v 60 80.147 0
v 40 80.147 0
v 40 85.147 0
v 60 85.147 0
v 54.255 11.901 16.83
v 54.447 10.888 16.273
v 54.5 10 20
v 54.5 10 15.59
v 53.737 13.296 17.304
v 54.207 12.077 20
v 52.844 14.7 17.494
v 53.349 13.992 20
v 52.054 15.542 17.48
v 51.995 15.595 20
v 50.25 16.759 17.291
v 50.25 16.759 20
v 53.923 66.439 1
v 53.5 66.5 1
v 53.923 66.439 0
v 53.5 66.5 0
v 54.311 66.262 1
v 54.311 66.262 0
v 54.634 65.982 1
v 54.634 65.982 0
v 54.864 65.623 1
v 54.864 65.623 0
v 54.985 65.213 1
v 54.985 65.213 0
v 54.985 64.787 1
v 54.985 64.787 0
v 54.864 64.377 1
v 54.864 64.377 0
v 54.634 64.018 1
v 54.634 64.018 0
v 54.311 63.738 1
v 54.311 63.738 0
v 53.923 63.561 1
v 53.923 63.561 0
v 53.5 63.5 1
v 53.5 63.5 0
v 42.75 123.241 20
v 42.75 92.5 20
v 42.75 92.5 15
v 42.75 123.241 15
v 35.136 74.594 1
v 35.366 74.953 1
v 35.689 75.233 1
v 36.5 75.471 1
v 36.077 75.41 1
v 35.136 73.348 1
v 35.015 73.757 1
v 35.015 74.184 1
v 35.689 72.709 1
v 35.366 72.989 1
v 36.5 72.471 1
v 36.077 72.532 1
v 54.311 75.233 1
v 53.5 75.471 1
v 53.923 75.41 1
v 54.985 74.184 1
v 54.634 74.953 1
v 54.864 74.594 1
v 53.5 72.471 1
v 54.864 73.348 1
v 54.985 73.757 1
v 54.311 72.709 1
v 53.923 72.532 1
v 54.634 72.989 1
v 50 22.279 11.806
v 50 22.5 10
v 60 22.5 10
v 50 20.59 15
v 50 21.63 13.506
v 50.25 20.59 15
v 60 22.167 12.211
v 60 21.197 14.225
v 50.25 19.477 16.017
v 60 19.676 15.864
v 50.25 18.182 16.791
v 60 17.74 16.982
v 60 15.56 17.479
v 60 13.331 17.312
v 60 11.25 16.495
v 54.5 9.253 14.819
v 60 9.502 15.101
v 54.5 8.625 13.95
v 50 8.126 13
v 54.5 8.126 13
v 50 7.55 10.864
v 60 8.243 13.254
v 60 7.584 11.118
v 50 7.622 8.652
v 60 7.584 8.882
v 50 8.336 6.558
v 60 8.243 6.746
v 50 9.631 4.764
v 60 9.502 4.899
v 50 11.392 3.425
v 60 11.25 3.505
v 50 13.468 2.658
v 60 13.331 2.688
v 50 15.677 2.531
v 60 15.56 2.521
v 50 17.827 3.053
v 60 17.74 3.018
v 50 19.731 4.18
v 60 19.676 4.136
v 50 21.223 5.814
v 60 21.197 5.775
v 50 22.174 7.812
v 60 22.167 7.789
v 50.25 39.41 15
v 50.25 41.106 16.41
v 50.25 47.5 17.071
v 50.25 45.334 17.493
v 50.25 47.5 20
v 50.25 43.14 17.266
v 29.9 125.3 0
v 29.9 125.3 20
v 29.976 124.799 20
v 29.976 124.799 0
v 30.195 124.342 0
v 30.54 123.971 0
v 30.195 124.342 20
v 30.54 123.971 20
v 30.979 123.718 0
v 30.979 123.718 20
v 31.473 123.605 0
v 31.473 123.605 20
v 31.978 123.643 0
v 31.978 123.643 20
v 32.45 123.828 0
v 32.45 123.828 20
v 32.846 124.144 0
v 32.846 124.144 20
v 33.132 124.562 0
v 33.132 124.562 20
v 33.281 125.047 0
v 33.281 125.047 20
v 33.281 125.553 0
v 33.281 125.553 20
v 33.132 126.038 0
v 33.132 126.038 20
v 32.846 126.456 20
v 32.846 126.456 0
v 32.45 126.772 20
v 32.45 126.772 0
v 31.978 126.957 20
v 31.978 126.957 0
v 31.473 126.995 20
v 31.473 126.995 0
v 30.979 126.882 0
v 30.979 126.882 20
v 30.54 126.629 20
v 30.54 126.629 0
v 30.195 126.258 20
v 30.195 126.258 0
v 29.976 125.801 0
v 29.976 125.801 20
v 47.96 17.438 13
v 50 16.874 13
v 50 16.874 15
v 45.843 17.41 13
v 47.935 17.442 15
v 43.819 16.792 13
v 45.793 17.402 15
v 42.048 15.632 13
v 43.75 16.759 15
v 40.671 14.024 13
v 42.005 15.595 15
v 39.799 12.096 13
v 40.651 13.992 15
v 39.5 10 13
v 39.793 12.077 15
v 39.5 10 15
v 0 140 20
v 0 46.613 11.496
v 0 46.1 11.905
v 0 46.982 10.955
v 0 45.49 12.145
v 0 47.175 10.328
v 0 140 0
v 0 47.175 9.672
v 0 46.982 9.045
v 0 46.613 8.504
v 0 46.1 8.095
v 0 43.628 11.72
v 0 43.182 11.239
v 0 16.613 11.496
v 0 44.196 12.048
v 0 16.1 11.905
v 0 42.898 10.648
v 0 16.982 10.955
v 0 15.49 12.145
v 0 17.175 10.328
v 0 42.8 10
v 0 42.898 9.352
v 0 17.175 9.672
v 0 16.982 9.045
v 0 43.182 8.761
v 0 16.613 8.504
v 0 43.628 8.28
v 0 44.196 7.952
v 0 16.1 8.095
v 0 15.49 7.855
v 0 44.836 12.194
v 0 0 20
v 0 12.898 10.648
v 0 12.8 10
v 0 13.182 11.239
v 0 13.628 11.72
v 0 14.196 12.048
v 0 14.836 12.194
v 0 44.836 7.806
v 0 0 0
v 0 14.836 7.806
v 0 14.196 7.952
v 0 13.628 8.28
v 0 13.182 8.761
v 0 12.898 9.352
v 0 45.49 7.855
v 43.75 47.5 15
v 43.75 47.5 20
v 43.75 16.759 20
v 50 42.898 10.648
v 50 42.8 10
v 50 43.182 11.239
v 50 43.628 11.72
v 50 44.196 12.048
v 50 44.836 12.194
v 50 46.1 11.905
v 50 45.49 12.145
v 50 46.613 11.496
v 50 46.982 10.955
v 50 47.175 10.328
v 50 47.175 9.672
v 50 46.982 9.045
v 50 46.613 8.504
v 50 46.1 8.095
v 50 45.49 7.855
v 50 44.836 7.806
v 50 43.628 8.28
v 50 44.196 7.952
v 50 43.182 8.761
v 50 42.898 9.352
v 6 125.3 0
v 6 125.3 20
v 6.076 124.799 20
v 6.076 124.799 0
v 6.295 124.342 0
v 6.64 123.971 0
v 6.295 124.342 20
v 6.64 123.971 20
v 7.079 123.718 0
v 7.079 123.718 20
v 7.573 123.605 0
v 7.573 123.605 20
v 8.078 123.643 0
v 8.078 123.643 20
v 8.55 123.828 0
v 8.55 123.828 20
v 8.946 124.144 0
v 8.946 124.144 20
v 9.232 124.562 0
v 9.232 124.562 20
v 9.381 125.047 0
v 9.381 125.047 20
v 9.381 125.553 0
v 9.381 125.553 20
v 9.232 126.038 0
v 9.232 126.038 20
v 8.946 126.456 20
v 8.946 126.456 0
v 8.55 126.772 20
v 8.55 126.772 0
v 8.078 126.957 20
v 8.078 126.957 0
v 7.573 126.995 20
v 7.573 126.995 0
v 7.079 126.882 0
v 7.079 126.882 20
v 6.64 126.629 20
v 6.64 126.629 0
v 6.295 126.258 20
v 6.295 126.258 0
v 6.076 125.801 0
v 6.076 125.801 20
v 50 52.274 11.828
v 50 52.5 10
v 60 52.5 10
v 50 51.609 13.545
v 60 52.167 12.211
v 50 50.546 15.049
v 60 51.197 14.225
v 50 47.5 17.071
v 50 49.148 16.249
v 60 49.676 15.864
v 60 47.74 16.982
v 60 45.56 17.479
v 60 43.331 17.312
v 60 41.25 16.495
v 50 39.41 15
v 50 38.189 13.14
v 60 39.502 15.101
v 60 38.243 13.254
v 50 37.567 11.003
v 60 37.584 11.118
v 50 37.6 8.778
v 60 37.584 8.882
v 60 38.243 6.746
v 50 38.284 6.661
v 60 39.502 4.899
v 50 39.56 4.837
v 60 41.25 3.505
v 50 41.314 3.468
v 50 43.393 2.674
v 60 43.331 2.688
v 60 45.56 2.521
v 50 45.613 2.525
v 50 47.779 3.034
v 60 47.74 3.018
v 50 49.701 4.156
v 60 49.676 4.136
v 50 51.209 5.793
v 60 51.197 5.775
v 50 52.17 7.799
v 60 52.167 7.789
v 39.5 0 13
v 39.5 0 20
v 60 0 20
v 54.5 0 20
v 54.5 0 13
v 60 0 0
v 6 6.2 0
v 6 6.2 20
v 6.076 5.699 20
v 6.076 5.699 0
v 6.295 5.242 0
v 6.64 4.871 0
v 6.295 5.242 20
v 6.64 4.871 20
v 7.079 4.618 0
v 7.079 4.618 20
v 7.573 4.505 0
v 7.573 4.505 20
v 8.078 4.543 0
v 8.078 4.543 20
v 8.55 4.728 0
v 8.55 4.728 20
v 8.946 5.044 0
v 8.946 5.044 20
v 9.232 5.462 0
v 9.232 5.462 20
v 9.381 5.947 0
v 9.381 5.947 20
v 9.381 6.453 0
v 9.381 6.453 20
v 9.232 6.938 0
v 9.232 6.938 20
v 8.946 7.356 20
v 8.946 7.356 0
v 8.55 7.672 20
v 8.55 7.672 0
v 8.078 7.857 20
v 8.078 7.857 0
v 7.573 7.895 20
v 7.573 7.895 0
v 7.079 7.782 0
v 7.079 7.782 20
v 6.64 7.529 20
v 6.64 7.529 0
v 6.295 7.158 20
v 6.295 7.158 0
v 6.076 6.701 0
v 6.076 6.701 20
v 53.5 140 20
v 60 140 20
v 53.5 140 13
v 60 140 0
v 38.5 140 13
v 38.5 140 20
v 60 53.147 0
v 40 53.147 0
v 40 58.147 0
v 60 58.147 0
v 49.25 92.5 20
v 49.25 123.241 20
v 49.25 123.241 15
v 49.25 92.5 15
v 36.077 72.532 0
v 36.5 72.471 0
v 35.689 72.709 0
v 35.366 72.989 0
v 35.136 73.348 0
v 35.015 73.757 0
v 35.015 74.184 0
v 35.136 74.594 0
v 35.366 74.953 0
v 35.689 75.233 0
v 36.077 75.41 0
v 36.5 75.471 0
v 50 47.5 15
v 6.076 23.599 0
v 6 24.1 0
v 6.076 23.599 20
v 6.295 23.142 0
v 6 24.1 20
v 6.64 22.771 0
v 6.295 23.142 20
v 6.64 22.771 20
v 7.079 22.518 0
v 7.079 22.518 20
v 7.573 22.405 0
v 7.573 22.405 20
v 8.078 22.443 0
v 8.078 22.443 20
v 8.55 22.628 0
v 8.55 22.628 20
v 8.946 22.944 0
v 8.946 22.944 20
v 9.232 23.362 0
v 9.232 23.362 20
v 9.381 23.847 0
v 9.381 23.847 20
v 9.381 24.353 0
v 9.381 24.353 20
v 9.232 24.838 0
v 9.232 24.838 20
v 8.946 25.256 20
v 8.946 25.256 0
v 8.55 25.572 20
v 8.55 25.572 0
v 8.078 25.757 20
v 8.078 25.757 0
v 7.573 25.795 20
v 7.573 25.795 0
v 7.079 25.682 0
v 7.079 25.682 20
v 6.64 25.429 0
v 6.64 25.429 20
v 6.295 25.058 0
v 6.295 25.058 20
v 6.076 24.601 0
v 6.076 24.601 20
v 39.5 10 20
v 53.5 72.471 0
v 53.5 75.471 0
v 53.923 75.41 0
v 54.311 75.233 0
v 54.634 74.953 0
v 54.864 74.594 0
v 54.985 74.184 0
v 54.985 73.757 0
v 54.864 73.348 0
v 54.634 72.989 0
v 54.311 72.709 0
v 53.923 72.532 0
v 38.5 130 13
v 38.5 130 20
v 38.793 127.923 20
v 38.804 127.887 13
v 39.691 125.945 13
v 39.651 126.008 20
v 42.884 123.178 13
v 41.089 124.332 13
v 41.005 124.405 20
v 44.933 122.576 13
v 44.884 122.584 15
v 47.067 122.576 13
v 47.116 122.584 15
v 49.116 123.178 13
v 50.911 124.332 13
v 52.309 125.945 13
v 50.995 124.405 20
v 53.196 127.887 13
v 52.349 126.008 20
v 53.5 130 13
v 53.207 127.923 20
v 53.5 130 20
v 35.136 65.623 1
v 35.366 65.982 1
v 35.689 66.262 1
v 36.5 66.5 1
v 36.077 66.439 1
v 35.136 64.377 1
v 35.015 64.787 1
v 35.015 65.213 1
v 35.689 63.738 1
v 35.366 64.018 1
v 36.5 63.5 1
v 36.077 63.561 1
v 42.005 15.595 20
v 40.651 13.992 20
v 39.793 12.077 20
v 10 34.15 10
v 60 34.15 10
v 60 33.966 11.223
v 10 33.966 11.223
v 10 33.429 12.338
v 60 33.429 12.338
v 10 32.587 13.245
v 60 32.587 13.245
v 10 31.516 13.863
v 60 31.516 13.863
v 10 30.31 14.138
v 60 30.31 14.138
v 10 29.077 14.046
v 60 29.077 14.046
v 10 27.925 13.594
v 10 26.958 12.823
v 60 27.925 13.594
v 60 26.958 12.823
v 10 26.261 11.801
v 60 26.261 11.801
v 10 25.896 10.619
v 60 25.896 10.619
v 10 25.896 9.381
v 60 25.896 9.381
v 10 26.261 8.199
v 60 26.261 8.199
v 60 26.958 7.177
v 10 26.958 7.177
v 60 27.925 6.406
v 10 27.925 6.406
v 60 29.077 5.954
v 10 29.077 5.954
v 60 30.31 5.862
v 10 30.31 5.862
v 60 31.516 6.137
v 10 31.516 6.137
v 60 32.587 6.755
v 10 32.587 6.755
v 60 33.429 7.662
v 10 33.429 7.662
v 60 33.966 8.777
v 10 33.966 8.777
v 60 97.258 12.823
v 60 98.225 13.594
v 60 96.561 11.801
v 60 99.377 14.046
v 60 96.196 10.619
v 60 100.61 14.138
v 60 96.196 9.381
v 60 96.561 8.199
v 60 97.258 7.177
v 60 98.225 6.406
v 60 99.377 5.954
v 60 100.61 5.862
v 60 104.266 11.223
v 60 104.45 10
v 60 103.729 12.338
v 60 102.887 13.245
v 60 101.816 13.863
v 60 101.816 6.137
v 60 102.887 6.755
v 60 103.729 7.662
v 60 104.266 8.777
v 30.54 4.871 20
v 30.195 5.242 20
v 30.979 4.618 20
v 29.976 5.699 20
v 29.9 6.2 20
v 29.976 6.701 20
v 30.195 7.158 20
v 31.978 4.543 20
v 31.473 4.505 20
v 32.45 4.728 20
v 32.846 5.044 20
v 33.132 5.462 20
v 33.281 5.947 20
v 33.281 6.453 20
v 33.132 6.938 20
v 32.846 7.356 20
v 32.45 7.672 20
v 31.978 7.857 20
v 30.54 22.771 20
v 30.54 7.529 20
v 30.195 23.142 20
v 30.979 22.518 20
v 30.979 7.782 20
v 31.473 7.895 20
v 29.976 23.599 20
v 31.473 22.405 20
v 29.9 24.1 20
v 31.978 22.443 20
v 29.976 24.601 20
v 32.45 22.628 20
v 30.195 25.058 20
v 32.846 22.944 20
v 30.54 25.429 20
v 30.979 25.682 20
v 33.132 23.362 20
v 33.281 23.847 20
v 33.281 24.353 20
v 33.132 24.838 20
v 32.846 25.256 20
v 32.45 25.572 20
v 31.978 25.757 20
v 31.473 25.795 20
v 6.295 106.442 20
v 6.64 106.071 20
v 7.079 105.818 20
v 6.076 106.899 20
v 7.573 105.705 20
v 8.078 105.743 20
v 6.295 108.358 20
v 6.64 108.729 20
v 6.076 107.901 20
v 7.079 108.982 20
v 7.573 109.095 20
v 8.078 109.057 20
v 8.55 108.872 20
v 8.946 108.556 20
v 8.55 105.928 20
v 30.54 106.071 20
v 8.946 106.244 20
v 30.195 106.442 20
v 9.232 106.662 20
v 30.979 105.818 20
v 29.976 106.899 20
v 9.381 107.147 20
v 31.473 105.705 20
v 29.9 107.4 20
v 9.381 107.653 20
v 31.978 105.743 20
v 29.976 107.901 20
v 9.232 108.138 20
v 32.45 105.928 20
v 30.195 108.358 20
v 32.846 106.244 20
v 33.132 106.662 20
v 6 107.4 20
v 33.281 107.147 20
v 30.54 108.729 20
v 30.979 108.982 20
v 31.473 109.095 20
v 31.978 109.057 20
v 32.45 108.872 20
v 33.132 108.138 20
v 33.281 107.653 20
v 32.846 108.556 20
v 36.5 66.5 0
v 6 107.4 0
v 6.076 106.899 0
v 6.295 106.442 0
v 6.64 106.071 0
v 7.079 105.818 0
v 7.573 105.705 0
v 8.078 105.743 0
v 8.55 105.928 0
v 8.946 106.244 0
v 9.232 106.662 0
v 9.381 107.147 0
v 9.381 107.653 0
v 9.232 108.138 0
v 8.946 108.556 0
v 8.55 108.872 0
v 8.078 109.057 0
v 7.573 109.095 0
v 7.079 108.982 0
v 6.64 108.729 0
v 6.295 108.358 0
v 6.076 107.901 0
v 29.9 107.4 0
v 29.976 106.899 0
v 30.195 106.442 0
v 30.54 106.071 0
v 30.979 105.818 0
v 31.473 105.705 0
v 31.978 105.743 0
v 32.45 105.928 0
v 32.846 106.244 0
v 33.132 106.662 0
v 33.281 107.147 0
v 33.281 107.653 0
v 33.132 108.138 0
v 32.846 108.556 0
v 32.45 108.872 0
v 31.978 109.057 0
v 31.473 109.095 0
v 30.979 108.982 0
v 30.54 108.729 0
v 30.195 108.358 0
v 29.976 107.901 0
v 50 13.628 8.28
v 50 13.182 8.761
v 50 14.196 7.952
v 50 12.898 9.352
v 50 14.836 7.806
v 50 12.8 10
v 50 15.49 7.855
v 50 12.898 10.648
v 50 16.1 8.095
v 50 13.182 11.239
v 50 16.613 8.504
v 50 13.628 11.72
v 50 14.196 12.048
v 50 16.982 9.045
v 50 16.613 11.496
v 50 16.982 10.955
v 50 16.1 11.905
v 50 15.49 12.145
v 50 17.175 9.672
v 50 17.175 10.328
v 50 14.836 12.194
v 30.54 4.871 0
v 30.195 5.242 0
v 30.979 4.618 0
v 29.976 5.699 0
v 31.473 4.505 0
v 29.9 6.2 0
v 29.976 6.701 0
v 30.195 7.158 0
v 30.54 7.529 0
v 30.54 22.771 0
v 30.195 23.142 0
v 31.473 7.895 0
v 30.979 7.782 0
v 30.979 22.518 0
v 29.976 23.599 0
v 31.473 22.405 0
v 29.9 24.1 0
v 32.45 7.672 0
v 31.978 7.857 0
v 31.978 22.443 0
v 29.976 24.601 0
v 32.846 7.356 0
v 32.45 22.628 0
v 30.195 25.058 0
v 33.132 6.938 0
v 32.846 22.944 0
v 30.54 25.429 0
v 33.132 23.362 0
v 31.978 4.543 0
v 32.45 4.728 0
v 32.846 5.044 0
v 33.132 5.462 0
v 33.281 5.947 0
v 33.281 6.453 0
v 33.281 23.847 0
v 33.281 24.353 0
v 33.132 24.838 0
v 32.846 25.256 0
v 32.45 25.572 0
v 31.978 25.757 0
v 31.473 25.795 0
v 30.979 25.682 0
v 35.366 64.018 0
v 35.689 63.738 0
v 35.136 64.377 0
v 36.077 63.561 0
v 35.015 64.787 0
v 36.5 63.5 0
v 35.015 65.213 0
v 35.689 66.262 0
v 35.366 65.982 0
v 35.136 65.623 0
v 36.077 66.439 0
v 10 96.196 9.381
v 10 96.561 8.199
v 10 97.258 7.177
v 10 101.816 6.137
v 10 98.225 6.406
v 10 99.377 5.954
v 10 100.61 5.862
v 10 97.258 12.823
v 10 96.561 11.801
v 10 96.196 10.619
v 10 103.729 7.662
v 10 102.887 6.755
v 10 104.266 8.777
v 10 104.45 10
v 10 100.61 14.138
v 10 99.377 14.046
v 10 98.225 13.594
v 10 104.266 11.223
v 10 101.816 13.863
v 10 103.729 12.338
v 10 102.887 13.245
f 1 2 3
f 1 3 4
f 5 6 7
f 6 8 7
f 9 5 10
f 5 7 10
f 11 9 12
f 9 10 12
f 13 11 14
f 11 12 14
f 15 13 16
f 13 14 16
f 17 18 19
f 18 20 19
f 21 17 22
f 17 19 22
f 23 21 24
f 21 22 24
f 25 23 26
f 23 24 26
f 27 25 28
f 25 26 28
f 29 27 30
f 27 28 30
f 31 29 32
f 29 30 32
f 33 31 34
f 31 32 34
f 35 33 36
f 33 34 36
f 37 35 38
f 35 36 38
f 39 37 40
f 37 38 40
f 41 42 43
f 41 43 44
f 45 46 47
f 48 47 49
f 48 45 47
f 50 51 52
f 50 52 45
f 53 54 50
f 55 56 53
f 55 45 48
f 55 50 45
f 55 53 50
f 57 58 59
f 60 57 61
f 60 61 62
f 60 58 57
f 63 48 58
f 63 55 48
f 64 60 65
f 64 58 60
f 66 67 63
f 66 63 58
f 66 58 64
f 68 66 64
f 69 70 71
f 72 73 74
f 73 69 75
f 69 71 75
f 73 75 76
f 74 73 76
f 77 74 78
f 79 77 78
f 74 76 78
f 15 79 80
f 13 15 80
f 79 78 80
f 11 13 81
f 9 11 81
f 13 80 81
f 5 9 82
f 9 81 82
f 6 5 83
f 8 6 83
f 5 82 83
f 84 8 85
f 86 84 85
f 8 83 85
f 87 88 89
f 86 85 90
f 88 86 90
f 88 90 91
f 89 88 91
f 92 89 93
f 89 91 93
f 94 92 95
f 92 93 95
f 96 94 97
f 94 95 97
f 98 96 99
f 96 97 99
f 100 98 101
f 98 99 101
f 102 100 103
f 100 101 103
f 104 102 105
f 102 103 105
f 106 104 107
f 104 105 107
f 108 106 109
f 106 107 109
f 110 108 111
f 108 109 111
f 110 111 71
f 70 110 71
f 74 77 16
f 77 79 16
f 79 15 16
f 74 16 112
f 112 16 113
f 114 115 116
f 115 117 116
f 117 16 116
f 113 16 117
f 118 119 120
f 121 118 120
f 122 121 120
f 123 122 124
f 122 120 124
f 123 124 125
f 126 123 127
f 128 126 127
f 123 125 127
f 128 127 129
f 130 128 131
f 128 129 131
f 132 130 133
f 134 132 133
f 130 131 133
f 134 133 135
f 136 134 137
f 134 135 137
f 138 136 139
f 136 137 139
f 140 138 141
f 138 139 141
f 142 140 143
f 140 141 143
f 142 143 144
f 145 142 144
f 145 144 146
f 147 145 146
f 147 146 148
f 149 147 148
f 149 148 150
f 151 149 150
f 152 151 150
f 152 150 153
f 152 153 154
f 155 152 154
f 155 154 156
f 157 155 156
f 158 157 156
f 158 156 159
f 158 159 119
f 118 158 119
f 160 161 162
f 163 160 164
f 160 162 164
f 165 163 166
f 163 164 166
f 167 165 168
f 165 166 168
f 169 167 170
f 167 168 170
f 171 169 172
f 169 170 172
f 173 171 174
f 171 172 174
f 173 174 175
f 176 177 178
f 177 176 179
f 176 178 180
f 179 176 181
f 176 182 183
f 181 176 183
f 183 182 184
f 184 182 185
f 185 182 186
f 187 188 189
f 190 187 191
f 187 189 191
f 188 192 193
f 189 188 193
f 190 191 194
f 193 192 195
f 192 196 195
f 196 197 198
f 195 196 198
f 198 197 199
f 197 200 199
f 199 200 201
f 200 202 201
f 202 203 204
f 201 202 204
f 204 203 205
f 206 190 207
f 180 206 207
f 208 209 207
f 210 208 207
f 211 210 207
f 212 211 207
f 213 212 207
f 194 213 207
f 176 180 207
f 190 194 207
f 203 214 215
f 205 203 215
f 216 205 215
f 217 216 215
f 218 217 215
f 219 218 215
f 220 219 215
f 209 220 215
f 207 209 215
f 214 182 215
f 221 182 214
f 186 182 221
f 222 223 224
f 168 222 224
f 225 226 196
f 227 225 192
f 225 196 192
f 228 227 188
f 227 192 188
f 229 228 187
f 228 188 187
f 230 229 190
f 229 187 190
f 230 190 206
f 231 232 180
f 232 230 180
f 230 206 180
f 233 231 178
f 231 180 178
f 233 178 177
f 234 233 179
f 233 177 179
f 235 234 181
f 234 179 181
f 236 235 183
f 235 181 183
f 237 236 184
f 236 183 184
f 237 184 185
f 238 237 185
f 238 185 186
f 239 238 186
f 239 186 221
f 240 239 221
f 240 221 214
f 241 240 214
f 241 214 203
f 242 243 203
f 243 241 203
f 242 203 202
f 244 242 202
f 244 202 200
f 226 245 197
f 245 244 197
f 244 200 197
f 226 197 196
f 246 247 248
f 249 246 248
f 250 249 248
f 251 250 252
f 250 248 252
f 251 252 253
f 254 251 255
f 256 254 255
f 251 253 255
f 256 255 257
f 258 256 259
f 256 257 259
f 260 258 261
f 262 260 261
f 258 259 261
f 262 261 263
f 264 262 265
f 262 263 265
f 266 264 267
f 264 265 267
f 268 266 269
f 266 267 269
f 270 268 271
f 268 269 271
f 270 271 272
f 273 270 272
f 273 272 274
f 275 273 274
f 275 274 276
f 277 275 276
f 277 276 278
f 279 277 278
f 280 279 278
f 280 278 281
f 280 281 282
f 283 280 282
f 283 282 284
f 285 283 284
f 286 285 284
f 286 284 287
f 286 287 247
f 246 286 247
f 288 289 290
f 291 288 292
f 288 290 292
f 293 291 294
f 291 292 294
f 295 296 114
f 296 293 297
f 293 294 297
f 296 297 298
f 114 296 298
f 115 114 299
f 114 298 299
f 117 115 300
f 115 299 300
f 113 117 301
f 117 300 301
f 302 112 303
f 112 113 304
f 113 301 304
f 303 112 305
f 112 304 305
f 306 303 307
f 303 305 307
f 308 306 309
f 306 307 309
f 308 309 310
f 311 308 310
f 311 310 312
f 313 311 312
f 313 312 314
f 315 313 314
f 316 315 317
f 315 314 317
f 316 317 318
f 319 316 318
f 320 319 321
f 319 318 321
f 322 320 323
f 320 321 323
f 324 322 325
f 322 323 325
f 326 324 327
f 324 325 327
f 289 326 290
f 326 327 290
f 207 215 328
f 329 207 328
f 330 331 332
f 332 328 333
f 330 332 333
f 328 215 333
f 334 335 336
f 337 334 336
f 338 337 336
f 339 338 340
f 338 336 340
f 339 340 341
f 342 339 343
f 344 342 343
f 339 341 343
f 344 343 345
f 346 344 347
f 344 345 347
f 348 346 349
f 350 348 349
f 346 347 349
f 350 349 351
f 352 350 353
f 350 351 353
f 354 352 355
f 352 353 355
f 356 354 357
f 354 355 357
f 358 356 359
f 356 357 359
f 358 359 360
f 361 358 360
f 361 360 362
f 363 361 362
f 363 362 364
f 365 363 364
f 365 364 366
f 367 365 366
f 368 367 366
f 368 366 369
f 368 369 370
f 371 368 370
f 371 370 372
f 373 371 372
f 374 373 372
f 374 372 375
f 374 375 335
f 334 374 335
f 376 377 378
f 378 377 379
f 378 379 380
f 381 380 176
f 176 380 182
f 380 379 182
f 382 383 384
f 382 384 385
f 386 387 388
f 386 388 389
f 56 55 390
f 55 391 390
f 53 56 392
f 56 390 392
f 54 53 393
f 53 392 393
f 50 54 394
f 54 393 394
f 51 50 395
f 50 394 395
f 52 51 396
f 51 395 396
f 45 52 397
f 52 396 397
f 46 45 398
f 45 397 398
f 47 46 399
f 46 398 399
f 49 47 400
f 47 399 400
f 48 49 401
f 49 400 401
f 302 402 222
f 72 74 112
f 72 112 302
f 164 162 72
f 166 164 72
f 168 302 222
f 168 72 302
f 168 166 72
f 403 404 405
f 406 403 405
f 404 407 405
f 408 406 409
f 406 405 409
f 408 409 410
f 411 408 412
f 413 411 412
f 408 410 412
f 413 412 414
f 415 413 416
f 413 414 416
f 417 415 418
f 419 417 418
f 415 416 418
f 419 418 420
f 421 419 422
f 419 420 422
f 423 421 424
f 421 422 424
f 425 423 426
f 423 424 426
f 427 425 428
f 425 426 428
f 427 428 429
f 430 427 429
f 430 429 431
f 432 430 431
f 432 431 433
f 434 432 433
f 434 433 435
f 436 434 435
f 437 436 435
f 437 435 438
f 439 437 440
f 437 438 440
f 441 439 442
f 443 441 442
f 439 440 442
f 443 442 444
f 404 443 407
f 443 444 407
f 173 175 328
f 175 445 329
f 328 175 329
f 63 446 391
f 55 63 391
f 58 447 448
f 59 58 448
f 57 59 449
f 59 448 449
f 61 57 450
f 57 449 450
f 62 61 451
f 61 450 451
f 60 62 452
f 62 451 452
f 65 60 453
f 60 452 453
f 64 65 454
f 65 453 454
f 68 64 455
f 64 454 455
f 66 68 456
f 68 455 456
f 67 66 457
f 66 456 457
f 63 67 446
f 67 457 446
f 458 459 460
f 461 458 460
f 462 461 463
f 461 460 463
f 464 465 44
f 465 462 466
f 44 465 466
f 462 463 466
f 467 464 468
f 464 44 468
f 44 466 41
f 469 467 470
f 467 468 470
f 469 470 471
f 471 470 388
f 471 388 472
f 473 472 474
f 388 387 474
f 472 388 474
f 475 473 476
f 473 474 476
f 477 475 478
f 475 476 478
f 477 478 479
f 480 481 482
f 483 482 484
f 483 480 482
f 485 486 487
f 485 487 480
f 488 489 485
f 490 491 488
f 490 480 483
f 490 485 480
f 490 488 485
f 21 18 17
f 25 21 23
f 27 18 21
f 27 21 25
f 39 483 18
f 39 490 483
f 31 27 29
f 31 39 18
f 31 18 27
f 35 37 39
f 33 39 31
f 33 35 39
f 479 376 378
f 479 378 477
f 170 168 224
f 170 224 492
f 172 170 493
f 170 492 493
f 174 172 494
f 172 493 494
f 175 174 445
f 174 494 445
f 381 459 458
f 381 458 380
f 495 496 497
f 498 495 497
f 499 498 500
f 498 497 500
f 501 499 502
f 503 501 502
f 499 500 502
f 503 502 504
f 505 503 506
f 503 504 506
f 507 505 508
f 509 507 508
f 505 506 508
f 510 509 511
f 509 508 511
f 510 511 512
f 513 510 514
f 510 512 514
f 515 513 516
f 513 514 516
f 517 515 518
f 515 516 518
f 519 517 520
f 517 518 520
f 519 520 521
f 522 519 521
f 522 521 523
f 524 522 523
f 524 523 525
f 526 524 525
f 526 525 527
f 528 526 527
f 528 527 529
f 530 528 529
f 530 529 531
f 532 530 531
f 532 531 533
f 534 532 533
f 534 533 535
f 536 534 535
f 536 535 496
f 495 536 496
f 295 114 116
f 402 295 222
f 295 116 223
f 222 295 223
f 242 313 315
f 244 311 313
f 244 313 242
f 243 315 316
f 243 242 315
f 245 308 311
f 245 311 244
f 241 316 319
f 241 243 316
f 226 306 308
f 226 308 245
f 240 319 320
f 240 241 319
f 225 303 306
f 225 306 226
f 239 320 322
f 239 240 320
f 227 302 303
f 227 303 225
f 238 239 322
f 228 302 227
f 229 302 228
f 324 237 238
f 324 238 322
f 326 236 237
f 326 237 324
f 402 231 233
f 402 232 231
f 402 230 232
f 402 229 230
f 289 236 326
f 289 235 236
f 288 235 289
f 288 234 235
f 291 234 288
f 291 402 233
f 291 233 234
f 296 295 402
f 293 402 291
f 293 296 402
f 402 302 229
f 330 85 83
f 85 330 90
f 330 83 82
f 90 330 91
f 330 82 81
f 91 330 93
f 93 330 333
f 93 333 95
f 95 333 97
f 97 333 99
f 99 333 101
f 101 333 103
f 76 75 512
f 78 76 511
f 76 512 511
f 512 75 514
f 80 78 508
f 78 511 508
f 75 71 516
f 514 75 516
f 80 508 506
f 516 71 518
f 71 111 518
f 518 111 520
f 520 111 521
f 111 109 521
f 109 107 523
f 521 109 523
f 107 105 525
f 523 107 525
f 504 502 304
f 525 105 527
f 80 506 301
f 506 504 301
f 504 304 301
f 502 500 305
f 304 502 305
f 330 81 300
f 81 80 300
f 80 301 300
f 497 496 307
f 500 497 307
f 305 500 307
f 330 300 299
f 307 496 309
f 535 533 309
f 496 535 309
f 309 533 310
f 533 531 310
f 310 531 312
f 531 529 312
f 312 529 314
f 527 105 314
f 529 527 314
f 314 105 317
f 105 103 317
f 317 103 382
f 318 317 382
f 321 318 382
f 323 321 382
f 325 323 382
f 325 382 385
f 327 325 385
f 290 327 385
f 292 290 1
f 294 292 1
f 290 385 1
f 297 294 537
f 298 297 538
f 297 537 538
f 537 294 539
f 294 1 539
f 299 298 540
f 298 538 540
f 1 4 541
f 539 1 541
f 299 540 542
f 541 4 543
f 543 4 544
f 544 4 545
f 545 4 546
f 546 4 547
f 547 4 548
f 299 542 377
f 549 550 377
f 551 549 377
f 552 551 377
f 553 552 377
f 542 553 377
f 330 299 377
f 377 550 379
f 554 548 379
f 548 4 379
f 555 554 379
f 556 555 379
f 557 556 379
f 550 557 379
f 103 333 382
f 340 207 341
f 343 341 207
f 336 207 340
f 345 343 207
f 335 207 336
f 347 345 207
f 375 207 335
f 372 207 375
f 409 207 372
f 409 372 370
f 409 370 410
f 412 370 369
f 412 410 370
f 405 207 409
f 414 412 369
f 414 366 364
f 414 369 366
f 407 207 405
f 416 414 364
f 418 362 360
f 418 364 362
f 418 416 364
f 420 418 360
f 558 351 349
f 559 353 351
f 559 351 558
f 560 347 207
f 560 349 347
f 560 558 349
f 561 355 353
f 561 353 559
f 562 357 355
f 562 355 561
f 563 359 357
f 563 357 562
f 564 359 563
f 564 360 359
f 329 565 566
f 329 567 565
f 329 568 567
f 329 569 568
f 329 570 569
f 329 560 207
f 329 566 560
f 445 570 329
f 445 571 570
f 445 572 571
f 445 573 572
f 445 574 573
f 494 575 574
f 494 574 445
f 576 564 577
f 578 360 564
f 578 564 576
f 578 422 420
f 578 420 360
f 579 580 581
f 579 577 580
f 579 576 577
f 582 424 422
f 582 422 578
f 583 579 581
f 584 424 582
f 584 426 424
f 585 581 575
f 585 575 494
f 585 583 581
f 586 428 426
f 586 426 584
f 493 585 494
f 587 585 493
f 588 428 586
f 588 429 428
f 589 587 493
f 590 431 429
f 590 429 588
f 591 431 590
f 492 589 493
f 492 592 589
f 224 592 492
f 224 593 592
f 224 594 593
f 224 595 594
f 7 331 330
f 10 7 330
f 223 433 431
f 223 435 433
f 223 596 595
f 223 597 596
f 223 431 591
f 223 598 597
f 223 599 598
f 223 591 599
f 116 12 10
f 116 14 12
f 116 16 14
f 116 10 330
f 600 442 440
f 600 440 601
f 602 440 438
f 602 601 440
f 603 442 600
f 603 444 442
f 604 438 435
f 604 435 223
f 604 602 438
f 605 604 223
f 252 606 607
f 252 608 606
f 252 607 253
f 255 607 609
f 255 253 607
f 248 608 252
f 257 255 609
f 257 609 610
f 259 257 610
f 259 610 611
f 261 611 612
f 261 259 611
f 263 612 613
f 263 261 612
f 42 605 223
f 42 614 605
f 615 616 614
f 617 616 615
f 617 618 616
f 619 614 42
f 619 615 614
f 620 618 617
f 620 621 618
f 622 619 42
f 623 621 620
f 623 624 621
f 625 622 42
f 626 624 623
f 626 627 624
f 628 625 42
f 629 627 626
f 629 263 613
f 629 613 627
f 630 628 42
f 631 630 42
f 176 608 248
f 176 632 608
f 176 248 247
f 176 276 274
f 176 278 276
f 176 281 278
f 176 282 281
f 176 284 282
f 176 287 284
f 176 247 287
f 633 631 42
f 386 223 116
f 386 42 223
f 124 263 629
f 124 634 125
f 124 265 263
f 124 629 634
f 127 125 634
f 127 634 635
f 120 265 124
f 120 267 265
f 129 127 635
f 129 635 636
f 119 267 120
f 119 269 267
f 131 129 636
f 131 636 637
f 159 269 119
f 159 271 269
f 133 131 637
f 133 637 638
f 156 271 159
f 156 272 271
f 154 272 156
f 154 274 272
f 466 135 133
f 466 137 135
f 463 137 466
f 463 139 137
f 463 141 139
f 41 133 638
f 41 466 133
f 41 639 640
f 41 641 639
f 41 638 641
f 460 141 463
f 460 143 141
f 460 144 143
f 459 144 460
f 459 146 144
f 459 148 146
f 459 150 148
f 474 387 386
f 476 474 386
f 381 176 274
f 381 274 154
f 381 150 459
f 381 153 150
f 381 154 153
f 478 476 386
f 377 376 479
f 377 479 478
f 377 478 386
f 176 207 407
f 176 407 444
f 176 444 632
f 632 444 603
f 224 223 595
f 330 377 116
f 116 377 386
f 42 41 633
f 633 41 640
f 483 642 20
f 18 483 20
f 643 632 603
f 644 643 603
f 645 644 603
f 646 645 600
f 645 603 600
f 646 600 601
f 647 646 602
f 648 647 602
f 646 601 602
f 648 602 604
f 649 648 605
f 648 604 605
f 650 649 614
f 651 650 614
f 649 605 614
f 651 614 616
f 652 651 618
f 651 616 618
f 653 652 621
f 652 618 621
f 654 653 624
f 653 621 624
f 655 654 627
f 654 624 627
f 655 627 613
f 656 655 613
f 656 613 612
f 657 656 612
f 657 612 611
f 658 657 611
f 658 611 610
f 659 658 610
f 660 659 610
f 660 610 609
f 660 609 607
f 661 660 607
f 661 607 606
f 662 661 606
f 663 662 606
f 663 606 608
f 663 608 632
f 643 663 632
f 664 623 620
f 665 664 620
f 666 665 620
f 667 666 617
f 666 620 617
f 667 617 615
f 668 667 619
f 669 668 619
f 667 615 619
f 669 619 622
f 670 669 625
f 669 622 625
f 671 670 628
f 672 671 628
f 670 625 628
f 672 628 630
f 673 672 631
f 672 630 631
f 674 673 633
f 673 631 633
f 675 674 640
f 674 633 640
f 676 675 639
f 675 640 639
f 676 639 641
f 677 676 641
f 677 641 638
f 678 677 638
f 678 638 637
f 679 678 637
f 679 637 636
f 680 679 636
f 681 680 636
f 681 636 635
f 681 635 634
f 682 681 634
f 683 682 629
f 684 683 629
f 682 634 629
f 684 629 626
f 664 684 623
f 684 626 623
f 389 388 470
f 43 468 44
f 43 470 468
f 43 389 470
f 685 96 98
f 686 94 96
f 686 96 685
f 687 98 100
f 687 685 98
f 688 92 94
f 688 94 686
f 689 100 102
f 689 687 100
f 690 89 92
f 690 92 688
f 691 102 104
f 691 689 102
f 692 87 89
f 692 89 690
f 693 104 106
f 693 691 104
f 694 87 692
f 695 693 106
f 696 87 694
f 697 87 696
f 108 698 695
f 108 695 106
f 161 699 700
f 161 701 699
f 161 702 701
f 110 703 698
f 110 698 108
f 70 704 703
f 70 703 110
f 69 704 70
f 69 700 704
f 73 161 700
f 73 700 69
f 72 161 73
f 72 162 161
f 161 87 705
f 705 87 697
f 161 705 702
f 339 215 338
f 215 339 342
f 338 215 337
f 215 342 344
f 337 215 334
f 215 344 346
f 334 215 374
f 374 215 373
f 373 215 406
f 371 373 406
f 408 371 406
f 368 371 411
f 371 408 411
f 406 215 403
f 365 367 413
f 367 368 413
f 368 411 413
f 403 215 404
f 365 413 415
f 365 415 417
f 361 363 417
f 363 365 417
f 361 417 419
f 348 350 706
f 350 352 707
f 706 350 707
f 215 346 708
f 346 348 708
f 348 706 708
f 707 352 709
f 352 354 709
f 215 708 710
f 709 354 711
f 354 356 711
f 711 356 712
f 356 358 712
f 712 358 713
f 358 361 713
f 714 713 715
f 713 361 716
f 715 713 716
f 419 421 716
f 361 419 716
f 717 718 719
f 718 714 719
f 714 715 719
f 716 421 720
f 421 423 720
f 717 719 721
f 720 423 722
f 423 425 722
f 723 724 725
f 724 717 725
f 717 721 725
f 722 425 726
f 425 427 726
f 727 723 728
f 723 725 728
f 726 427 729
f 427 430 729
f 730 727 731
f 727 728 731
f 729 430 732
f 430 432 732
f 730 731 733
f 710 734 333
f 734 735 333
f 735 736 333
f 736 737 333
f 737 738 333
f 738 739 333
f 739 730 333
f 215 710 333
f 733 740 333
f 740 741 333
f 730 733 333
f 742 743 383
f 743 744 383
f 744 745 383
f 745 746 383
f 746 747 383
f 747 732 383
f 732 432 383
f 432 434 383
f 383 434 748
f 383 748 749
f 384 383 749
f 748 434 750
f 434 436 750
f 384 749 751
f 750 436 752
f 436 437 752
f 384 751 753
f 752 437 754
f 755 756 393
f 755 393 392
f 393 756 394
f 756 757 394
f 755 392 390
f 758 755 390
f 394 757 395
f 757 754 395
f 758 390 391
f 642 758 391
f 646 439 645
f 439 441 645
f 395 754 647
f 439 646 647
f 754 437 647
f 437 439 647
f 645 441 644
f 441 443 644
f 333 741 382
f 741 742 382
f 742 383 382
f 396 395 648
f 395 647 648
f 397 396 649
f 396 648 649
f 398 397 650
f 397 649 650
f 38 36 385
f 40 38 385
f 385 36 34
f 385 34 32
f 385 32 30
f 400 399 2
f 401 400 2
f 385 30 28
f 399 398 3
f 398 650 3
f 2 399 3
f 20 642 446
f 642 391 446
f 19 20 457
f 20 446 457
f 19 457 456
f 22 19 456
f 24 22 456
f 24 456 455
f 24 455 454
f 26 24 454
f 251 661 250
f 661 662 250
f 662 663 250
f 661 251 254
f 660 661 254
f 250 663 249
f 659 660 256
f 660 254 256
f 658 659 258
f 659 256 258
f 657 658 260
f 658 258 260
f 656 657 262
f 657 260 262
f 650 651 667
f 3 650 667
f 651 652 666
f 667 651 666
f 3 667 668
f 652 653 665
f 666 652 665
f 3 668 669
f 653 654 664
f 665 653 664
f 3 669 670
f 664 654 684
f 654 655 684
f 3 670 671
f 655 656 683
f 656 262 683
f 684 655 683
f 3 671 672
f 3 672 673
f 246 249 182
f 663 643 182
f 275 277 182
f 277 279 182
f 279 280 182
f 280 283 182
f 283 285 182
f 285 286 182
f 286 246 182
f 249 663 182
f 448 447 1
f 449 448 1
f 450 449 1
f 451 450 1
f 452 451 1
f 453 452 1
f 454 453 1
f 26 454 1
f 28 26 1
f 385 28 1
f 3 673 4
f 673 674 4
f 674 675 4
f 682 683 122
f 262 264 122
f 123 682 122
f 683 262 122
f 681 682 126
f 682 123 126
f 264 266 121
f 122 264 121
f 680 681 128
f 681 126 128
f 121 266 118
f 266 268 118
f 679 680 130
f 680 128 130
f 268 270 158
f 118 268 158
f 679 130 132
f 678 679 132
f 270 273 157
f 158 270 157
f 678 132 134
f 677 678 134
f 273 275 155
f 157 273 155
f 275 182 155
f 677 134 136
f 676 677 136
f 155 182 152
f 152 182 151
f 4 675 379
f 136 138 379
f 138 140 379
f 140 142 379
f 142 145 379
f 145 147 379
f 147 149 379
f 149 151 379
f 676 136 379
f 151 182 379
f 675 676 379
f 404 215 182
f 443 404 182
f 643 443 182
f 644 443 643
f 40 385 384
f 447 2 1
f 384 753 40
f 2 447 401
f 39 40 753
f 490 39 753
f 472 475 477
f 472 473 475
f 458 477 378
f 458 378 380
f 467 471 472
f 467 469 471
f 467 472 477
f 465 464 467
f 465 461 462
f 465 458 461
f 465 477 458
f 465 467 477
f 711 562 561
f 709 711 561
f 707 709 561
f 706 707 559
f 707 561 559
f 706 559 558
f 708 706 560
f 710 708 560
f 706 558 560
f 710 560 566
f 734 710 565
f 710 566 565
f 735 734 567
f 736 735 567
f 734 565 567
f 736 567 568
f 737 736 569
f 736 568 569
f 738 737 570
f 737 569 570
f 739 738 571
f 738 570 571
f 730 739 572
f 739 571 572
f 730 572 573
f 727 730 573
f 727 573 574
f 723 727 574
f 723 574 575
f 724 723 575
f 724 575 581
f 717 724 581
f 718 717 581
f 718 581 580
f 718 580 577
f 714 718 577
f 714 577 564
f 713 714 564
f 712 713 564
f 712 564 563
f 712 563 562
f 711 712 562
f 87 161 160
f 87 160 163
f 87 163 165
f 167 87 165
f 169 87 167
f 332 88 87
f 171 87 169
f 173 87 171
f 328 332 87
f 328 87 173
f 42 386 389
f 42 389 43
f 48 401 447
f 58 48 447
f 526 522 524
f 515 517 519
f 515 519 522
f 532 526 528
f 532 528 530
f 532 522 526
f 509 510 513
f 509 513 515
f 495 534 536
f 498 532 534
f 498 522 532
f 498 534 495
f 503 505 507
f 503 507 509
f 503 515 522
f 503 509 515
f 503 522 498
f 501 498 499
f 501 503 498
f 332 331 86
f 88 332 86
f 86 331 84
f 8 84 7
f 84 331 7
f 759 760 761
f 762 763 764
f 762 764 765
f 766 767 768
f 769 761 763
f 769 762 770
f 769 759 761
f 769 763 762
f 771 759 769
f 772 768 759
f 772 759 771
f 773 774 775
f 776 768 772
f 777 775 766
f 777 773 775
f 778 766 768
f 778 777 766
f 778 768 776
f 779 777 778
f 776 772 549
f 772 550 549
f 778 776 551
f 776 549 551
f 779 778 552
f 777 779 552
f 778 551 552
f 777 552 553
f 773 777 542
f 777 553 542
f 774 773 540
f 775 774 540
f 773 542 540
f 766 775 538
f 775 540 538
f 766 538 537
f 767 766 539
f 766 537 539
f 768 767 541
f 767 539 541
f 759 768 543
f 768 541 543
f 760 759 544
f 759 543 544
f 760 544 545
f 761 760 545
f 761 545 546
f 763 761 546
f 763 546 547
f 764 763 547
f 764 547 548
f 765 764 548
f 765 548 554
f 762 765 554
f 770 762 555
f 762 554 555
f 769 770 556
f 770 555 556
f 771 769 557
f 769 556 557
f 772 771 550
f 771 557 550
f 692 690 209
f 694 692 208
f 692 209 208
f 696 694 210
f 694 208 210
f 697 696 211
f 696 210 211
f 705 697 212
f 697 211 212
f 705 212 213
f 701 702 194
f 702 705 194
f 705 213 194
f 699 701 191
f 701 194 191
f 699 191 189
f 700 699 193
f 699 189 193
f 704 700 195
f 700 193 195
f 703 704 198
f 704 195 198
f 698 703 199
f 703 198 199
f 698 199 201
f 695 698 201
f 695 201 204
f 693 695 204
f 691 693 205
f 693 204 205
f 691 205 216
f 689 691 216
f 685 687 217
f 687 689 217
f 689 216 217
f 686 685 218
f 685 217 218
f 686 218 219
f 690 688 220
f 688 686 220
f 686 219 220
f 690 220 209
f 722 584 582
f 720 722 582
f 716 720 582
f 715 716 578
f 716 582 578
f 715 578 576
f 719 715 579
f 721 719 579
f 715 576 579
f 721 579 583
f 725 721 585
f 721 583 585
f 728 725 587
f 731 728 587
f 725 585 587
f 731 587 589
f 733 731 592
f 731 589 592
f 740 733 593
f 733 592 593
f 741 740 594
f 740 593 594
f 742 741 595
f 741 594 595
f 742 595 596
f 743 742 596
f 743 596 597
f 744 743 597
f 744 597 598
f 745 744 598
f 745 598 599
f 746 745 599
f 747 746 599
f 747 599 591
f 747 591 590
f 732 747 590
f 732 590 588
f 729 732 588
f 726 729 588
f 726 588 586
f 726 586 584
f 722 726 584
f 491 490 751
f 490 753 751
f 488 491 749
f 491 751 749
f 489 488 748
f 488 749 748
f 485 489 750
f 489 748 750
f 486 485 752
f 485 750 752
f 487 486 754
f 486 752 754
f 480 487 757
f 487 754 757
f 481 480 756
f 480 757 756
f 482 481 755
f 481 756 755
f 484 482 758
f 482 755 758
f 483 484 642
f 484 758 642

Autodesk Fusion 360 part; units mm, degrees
sketch "Skizze1" plane through (0, 0, 0) normal (0, 0, 1) x (1, 0, 0)
  line L0 (0, 0) -> (60, 0)
  line L1 (60, 0) -> (60, 140)
  line L2 (60, 140) -> (0, 140)
  line L3 (0, 140) -> (0, 0)
  dimension "d1" = 60
  dimension "d2" = 140
extrude "Extrusion1" add sketch "Skizze1" along normal blind 20
sketch "Skizze2" plane through (60, 0, 0) normal (1, 0, 0) x (0, 1, 0)
  line L0 (0, 0) -> (140, 0)
  line L1 (140, 0) -> (140, 20)
  line L2 (140, 20) -> (0, 20)
  line L3 (0, 20) -> (0, 0)
  circle A0 centre (30, 10) radius 4.15
  circle A1 centre (100.3, 10) radius 4.15
  point P0 (0, 10)
  dimension "d5" = 8.3
  dimension "d6" = 8.3
extrude "Extrusion2" cut sketch "Skizze2" against normal blind 50 contours A0 | A1
sketch "Skizze3" plane through (0, 0, 20) normal (0, 0, 1) x (-1, 0, 0)
  line L0 (0, -140) -> (0, 0)
  line L1 (0, 0) -> (-60, 0)
  line L2 (-60, 0) -> (-60, -140)
  line L3 (-60, -140) -> (0, -140)
  circle A0 centre (-31.6, -24.1) radius 1.7
  circle A1 centre (-7.7, -24.1) radius 1.7
  circle A2 centre (-31.6, -6.2) radius 1.7
  circle A3 centre (-7.7, -6.2) radius 1.7
  circle A4 centre (-7.7, -107.4) radius 1.7
  circle A5 centre (-31.6, -125.3) radius 1.7
  circle A6 centre (-7.7, -125.3) radius 1.7
  circle A7 centre (-31.6, -107.4) radius 1.7
  dimension "d9" = 3.4
  dimension "d10" = 3.4
  dimension "d11" = 3.4
  dimension "d12" = 3.4
  dimension "d13" = 3.4
  dimension "d14" = 3.4
  dimension "d15" = 3.4
  dimension "d16" = 3.4
extrude "Extrusion3" cut sketch "Skizze3" against normal blind 20 contours A0 | A1 | A2 | A3 | A4 | A5 | A6 | A7
sketch "Skizze5" plane through (0, 0, 0) normal (0, 0, -1) x (1, 0, 0)
  line L0 (0, 0) -> (0, -140)
  line L1 (0, -140) -> (60, -140)
  line L2 (60, -140) -> (60, 0)
  line L3 (60, 0) -> (0, 0)
  circle A0 centre (46, -130) radius 1
  circle A1 centre (7.7, -125.3) radius 1.7
  circle A2 centre (31.6, -24.1) radius 1.7
  circle A3 centre (31.6, -6.2) radius 1.7
  circle A4 centre (31.6, -125.3) radius 1.7
  circle A5 centre (7.7, -107.4) radius 1.7
  circle A6 centre (7.7, -24.1) radius 1.7
  circle A7 centre (7.7, -6.2) radius 1.7
  circle A8 centre (31.6, -107.4) radius 1.7
  dimension "d22" = 2
sketch "Skizze6" plane through (0, 0, 0) normal (0, 0, -1) x (1, 0, 0)
  circle A0 centre (7.7, -125.3) radius 1.7
  circle A1 centre (31.6, -24.1) radius 1.7
  circle A2 centre (31.6, -6.2) radius 1.7
  circle A3 centre (31.6, -125.3) radius 1.7
  circle A4 centre (7.7, -107.4) radius 1.7
  circle A5 centre (7.7, -24.1) radius 1.7
  circle A6 centre (7.7, -6.2) radius 1.7
  circle A7 centre (31.6, -107.4) radius 1.7
  line L0 (0, 0) -> (0, -140)
  line L1 (0, -140) -> (60, -140)
  line L2 (60, -140) -> (60, 0)
  line L3 (60, 0) -> (0, 0)
  line L4 (60, -53.1468) -> (40, -53.1468)
  line L5 (40, -53.1468) -> (40, -85.1468)
  line L6 (40, -85.1468) -> (60, -85.1468)
  line L7 (60, -85.1468) -> (60, -53.1468)
  line L8 (60, -53.1468) -> (40, -53.1468)
  line L9 (40, -53.1468) -> (40, -58.1468)
  line L10 (40, -58.1468) -> (60, -58.1468)
  line L11 (60, -58.1468) -> (60, -53.1468)
  line L12 (40, -85.1468) -> (60, -85.1468)
  line L13 (60, -85.1468) -> (60, -80.1468)
  line L14 (60, -80.1468) -> (40, -80.1468)
  line L15 (40, -80.1468) -> (40, -85.1468)
  line L16 (53.5, -63.5) -> (36.5, -63.5)
  arc A8 (36.5, -63.5) -> (36.5, -66.5) centre (36.5, -65) ccw
  line L17 (36.5, -66.5) -> (53.5, -66.5)
  arc A9 (53.5, -66.5) -> (53.5, -63.5) centre (53.5, -65) ccw
  line L18 (55, -65) -> (35, -65) construction
  line L19 (36.5, -75.4708) -> (53.5, -75.4708)
  arc A10 (53.5, -75.4708) -> (53.5, -72.4708) centre (53.5, -73.9708) ccw
  line L20 (53.5, -72.4708) -> (36.5, -72.4708)
  arc A11 (36.5, -72.4708) -> (36.5, -75.4708) centre (36.5, -73.9708) ccw
  line L21 (35, -73.9708) -> (55, -73.9708) construction
  dimension "d31" = 20
  dimension "d32" = 32
  dimension "d33" = 20
  dimension "d34" = 5
  dimension "d35" = 20
  dimension "d36" = 5
  dimension "d72" = 3
  dimension "d73" = 3
extrude "Extrusion19" cut sketch "Skizze6" against normal blind 1 contours L5 L16 L17 A9 | L5 L16 A8 L17 | L5 L19 L20 A11 | L5 L19 A10 L20
extrude "Extrusion7" add sketch "Skizze6" along normal blind 12 contours L2 L4 L5 L7 L8 L9 L10 L11 | L2 L5 L6 L7 L12 L13 L14 L15
sketch "Skizze8" plane through (0, 0, 0) normal (-1, 0, 0) x (0, -1, 0)
  line L0 (-140, 0) -> (0, 0)
  line L1 (0, 0) -> (0, 20)
  line L2 (0, 20) -> (-140, 20)
  line L3 (-140, 20) -> (-140, 0)
  circle A0 centre (-15, 10) radius 2.2
  circle A1 centre (-45, 10) radius 2.2
  dimension "d27" = 4.4
  dimension "d28" = 4.4
extrude "Extrusion6" cut sketch "Skizze8" against normal blind 60 contours A0 | A1
sketch "Skizze10" plane through (60, 0, 0) normal (1, 0, 0) x (0, 1, 0)
  line L0 (58.1468, -12) -> (58.1468, 0)
  line L1 (58.1468, 0) -> (80.1468, 0)
  line L2 (80.1468, 0) -> (80.1468, -12)
  circle A0 centre (15, 10) radius 2.2
  circle A1 centre (45, 10) radius 2.2
  circle A2 centre (30, 10) radius 4.15
  circle A3 centre (100.3, 10) radius 4.15
  line L3 (53.1468, -12) -> (58.1468, -12)
  line L4 (85.1468, -12) -> (85.1468, 0)
  line L5 (85.1468, 0) -> (140, 0)
  line L6 (140, 0) -> (140, 20)
  line L7 (140, 20) -> (0, 20)
  line L8 (0, 20) -> (0, 0)
  line L9 (0, 0) -> (53.1468, 0)
  line L10 (53.1468, 0) -> (53.1468, -12)
  circle A4 centre (15, 10) radius 7.5
  circle A5 centre (45, 10) radius 7.5
  line L11 (80.1468, -12) -> (85.1468, -12)
  dimension "d42" = 15
  dimension "d43" = 15
extrude "Extrusion9" cut sketch "Skizze10" against normal blind 10 contours A4 | A5
sketch "Skizze13" plane through (0, 0, 20) normal (0, 0, 1) x (-1, 0, 0)
  circle A0 centre (-7.7, -125.3) radius 1.7
  circle A1 centre (-31.6, -24.1) radius 1.7
  circle A2 centre (-31.6, -6.2) radius 1.7
  circle A3 centre (-31.6, -125.3) radius 1.7
  circle A4 centre (-7.7, -107.4) radius 1.7
  circle A5 centre (-7.7, -24.1) radius 1.7
  circle A6 centre (-7.7, -6.2) radius 1.7
  circle A7 centre (-31.6, -107.4) radius 1.7
  line L0 (0, -140) -> (0, 0)
  line L1 (0, 0) -> (-60, 0)
  line L2 (-60, 0) -> (-60, -140)
  line L3 (-60, -140) -> (0, -140)
  circle A8 centre (-47, -10) radius 7.5
  dimension "d53" = 15
extrude "Extrusion12" cut sketch "Skizze13" against normal blind 5 contours A8
sketch "Skizze14" plane through (0, 0, 15) normal (0, 0, 1) x (-1, 0, 0)
  line L0 (-50, -9.4098) -> (-50, -16.8739)
  arc A0 (-50, -16.8739) -> (-54.4767, -9.4098) centre (-47, -10) ccw
  line L1 (-54.4767, -9.4098) -> (-50, -9.4098)
  circle A1 centre (-47, -10) radius 1
  dimension "d56" = 2
extrude "Extrusion13" cut sketch "Skizze14" against normal blind 1 contours A1
sketch "Skizze15" plane through (0, 0, 20) normal (0, 0, 1) x (-1, 0, 0)
  circle A0 centre (-47, -10) radius 7.5
  circle A1 centre (-7.7, -125.3) radius 1.7
  circle A2 centre (-31.6, -24.1) radius 1.7
  circle A3 centre (-31.6, -6.2) radius 1.7
  circle A4 centre (-31.6, -125.3) radius 1.7
  circle A5 centre (-7.7, -107.4) radius 1.7
  circle A6 centre (-7.7, -24.1) radius 1.7
  circle A7 centre (-7.7, -6.2) radius 1.7
  circle A8 centre (-31.6, -107.4) radius 1.7
  line L0 (0, -140) -> (0, 0)
  line L1 (0, 0) -> (-60, 0)
  line L2 (-60, 0) -> (-60, -140)
  line L3 (-60, -140) -> (0, -140)
  line L4 (-39.5, 0) -> (-54.5, 0)
  line L5 (-54.5, 0) -> (-54.5, -17.5)
  line L6 (-54.5, -17.5) -> (-39.5, -17.5)
  line L7 (-39.5, -17.5) -> (-39.5, 0)
extrude "Extrusion14" cut sketch "Skizze15" against normal blind 7 contours A0 | A0 L1 L4 L5 L7
sketch "Skizze16" plane through (0, 0, 20) normal (0, 0, 1) x (-1, 0, 0)
  circle A0 centre (-31.6, -107.4) radius 1.7
  circle A1 centre (-7.7, -6.2) radius 1.7
  circle A2 centre (-7.7, -24.1) radius 1.7
  circle A3 centre (-7.7, -107.4) radius 1.7
  circle A4 centre (-31.6, -125.3) radius 1.7
  circle A5 centre (-31.6, -6.2) radius 1.7
  circle A6 centre (-31.6, -24.1) radius 1.7
  circle A7 centre (-7.7, -125.3) radius 1.7
  line L0 (-39.5, 0) -> (-39.5, -10)
  arc A8 (-54.5, -10) -> (-39.5, -10) centre (-47, -10) ccw
  line L1 (-54.5, -10) -> (-54.5, 0)
  line L2 (-54.5, 0) -> (-60, 0)
  line L3 (-60, 0) -> (-60, -140)
  line L4 (-60, -140) -> (0, -140)
  line L5 (0, -140) -> (0, 0)
  line L6 (0, 0) -> (-39.5, 0)
  circle A9 centre (-46, -130) radius 7.5
  line L7 (-38.5, -140) -> (-53.5, -140)
  line L8 (-53.5, -140) -> (-53.5, -122.5)
  line L9 (-53.5, -122.5) -> (-38.5, -122.5)
  line L10 (-38.5, -122.5) -> (-38.5, -140)
  dimension "d61" = 15
extrude "Extrusion15" cut sketch "Skizze16" against normal blind 7 contours L4 A9 L7 L8 L10 | A9
sketch "Skizze17" plane through (0, 0, 20) normal (0, 0, 1) x (-1, 0, 0)
  line L0 (-38.5, -130) -> (-38.5, -140)
  line L1 (-38.5, -140) -> (0, -140)
  line L2 (0, -140) -> (0, 0)
  line L3 (0, 0) -> (-39.5, 0)
  line L4 (-39.5, 0) -> (-39.5, -10)
  arc A0 (-54.5, -10) -> (-39.5, -10) centre (-47, -10) ccw
  line L5 (-54.5, -10) -> (-54.5, 0)
  line L6 (-54.5, 0) -> (-60, 0)
  line L7 (-60, 0) -> (-60, -140)
  line L8 (-60, -140) -> (-53.5, -140)
  line L9 (-53.5, -140) -> (-53.5, -130)
  arc A1 (-38.5, -130) -> (-53.5, -130) centre (-46, -130) ccw
  circle A2 centre (-31.6, -107.4) radius 1.7
  circle A3 centre (-7.7, -6.2) radius 1.7
  circle A4 centre (-7.7, -24.1) radius 1.7
  circle A5 centre (-7.7, -107.4) radius 1.7
  circle A6 centre (-31.6, -125.3) radius 1.7
  circle A7 centre (-31.6, -6.2) radius 1.7
  circle A8 centre (-31.6, -24.1) radius 1.7
  circle A9 centre (-7.7, -125.3) radius 1.7
  line L10 (-49.25, -92.5) -> (-42.75, -92.5)
  line L11 (-42.75, -92.5) -> (-42.75, -152.5)
  line L12 (-42.75, -152.5) -> (-49.25, -152.5)
  line L13 (-49.25, -152.5) -> (-49.25, -92.5)
  line L14 (-49.25, -92.5) -> (-42.75, -152.5) construction
  line L15 (-42.75, -92.5) -> (-49.25, -152.5) construction
  point P0 (-46, -122.5)
  dimension "d64" = 60
  dimension "d65" = 6.5
extrude "Extrusion16" cut sketch "Skizze17" against normal blind 5 contours A1 L10 L11 L13
sketch "Skizze18" plane through (0, 0, 20) normal (0, 0, 1) x (-1, 0, 0)
  line L0 (-42.75, -92.5) -> (-42.75, -123.2407)
  arc A0 (-38.5, -130) -> (-42.75, -123.2407) centre (-46, -130) ccw
  line L1 (-38.5, -130) -> (-38.5, -140)
  line L2 (-38.5, -140) -> (0, -140)
  line L3 (0, -140) -> (0, 0)
  line L4 (0, 0) -> (-39.5, 0)
  line L5 (-39.5, 0) -> (-39.5, -10)
  arc A1 (-54.5, -10) -> (-39.5, -10) centre (-47, -10) ccw
  line L6 (-54.5, -10) -> (-54.5, 0)
  line L7 (-54.5, 0) -> (-60, 0)
  line L8 (-60, 0) -> (-60, -140)
  line L9 (-60, -140) -> (-53.5, -140)
  line L10 (-53.5, -140) -> (-53.5, -130)
  arc A2 (-49.25, -123.2407) -> (-53.5, -130) centre (-46, -130) ccw
  line L11 (-49.25, -123.2407) -> (-49.25, -92.5)
  line L12 (-49.25, -92.5) -> (-42.75, -92.5)
  circle A3 centre (-31.6, -107.4) radius 1.7
  circle A4 centre (-7.7, -6.2) radius 1.7
  circle A5 centre (-7.7, -24.1) radius 1.7
  circle A6 centre (-7.7, -107.4) radius 1.7
  circle A7 centre (-31.6, -125.3) radius 1.7
  circle A8 centre (-31.6, -6.2) radius 1.7
  circle A9 centre (-31.6, -24.1) radius 1.7
  circle A10 centre (-7.7, -125.3) radius 1.7
  line L13 (-50.25, -47.5) -> (-43.75, -47.5)
  line L14 (-43.75, -47.5) -> (-43.75, 12.5)
  line L15 (-43.75, 12.5) -> (-50.25, 12.5)
  line L16 (-50.25, 12.5) -> (-50.25, -47.5)
  line L17 (-50.25, -47.5) -> (-43.75, 12.5) construction
  line L18 (-43.75, -47.5) -> (-50.25, 12.5) construction
  point P0 (-47, -17.5)
  dimension "d68" = 6.5
  dimension "d69" = 60
extrude "Extrusion17" cut sketch "Skizze18" against normal blind 5 contours A1 L13 L14 L16
extrude "Extrusion18" cut 2 faces at (46.6667, 54.8135, -12) (53.3333, 83.4802, -12) along direction (0, 0, 1) blind 12
